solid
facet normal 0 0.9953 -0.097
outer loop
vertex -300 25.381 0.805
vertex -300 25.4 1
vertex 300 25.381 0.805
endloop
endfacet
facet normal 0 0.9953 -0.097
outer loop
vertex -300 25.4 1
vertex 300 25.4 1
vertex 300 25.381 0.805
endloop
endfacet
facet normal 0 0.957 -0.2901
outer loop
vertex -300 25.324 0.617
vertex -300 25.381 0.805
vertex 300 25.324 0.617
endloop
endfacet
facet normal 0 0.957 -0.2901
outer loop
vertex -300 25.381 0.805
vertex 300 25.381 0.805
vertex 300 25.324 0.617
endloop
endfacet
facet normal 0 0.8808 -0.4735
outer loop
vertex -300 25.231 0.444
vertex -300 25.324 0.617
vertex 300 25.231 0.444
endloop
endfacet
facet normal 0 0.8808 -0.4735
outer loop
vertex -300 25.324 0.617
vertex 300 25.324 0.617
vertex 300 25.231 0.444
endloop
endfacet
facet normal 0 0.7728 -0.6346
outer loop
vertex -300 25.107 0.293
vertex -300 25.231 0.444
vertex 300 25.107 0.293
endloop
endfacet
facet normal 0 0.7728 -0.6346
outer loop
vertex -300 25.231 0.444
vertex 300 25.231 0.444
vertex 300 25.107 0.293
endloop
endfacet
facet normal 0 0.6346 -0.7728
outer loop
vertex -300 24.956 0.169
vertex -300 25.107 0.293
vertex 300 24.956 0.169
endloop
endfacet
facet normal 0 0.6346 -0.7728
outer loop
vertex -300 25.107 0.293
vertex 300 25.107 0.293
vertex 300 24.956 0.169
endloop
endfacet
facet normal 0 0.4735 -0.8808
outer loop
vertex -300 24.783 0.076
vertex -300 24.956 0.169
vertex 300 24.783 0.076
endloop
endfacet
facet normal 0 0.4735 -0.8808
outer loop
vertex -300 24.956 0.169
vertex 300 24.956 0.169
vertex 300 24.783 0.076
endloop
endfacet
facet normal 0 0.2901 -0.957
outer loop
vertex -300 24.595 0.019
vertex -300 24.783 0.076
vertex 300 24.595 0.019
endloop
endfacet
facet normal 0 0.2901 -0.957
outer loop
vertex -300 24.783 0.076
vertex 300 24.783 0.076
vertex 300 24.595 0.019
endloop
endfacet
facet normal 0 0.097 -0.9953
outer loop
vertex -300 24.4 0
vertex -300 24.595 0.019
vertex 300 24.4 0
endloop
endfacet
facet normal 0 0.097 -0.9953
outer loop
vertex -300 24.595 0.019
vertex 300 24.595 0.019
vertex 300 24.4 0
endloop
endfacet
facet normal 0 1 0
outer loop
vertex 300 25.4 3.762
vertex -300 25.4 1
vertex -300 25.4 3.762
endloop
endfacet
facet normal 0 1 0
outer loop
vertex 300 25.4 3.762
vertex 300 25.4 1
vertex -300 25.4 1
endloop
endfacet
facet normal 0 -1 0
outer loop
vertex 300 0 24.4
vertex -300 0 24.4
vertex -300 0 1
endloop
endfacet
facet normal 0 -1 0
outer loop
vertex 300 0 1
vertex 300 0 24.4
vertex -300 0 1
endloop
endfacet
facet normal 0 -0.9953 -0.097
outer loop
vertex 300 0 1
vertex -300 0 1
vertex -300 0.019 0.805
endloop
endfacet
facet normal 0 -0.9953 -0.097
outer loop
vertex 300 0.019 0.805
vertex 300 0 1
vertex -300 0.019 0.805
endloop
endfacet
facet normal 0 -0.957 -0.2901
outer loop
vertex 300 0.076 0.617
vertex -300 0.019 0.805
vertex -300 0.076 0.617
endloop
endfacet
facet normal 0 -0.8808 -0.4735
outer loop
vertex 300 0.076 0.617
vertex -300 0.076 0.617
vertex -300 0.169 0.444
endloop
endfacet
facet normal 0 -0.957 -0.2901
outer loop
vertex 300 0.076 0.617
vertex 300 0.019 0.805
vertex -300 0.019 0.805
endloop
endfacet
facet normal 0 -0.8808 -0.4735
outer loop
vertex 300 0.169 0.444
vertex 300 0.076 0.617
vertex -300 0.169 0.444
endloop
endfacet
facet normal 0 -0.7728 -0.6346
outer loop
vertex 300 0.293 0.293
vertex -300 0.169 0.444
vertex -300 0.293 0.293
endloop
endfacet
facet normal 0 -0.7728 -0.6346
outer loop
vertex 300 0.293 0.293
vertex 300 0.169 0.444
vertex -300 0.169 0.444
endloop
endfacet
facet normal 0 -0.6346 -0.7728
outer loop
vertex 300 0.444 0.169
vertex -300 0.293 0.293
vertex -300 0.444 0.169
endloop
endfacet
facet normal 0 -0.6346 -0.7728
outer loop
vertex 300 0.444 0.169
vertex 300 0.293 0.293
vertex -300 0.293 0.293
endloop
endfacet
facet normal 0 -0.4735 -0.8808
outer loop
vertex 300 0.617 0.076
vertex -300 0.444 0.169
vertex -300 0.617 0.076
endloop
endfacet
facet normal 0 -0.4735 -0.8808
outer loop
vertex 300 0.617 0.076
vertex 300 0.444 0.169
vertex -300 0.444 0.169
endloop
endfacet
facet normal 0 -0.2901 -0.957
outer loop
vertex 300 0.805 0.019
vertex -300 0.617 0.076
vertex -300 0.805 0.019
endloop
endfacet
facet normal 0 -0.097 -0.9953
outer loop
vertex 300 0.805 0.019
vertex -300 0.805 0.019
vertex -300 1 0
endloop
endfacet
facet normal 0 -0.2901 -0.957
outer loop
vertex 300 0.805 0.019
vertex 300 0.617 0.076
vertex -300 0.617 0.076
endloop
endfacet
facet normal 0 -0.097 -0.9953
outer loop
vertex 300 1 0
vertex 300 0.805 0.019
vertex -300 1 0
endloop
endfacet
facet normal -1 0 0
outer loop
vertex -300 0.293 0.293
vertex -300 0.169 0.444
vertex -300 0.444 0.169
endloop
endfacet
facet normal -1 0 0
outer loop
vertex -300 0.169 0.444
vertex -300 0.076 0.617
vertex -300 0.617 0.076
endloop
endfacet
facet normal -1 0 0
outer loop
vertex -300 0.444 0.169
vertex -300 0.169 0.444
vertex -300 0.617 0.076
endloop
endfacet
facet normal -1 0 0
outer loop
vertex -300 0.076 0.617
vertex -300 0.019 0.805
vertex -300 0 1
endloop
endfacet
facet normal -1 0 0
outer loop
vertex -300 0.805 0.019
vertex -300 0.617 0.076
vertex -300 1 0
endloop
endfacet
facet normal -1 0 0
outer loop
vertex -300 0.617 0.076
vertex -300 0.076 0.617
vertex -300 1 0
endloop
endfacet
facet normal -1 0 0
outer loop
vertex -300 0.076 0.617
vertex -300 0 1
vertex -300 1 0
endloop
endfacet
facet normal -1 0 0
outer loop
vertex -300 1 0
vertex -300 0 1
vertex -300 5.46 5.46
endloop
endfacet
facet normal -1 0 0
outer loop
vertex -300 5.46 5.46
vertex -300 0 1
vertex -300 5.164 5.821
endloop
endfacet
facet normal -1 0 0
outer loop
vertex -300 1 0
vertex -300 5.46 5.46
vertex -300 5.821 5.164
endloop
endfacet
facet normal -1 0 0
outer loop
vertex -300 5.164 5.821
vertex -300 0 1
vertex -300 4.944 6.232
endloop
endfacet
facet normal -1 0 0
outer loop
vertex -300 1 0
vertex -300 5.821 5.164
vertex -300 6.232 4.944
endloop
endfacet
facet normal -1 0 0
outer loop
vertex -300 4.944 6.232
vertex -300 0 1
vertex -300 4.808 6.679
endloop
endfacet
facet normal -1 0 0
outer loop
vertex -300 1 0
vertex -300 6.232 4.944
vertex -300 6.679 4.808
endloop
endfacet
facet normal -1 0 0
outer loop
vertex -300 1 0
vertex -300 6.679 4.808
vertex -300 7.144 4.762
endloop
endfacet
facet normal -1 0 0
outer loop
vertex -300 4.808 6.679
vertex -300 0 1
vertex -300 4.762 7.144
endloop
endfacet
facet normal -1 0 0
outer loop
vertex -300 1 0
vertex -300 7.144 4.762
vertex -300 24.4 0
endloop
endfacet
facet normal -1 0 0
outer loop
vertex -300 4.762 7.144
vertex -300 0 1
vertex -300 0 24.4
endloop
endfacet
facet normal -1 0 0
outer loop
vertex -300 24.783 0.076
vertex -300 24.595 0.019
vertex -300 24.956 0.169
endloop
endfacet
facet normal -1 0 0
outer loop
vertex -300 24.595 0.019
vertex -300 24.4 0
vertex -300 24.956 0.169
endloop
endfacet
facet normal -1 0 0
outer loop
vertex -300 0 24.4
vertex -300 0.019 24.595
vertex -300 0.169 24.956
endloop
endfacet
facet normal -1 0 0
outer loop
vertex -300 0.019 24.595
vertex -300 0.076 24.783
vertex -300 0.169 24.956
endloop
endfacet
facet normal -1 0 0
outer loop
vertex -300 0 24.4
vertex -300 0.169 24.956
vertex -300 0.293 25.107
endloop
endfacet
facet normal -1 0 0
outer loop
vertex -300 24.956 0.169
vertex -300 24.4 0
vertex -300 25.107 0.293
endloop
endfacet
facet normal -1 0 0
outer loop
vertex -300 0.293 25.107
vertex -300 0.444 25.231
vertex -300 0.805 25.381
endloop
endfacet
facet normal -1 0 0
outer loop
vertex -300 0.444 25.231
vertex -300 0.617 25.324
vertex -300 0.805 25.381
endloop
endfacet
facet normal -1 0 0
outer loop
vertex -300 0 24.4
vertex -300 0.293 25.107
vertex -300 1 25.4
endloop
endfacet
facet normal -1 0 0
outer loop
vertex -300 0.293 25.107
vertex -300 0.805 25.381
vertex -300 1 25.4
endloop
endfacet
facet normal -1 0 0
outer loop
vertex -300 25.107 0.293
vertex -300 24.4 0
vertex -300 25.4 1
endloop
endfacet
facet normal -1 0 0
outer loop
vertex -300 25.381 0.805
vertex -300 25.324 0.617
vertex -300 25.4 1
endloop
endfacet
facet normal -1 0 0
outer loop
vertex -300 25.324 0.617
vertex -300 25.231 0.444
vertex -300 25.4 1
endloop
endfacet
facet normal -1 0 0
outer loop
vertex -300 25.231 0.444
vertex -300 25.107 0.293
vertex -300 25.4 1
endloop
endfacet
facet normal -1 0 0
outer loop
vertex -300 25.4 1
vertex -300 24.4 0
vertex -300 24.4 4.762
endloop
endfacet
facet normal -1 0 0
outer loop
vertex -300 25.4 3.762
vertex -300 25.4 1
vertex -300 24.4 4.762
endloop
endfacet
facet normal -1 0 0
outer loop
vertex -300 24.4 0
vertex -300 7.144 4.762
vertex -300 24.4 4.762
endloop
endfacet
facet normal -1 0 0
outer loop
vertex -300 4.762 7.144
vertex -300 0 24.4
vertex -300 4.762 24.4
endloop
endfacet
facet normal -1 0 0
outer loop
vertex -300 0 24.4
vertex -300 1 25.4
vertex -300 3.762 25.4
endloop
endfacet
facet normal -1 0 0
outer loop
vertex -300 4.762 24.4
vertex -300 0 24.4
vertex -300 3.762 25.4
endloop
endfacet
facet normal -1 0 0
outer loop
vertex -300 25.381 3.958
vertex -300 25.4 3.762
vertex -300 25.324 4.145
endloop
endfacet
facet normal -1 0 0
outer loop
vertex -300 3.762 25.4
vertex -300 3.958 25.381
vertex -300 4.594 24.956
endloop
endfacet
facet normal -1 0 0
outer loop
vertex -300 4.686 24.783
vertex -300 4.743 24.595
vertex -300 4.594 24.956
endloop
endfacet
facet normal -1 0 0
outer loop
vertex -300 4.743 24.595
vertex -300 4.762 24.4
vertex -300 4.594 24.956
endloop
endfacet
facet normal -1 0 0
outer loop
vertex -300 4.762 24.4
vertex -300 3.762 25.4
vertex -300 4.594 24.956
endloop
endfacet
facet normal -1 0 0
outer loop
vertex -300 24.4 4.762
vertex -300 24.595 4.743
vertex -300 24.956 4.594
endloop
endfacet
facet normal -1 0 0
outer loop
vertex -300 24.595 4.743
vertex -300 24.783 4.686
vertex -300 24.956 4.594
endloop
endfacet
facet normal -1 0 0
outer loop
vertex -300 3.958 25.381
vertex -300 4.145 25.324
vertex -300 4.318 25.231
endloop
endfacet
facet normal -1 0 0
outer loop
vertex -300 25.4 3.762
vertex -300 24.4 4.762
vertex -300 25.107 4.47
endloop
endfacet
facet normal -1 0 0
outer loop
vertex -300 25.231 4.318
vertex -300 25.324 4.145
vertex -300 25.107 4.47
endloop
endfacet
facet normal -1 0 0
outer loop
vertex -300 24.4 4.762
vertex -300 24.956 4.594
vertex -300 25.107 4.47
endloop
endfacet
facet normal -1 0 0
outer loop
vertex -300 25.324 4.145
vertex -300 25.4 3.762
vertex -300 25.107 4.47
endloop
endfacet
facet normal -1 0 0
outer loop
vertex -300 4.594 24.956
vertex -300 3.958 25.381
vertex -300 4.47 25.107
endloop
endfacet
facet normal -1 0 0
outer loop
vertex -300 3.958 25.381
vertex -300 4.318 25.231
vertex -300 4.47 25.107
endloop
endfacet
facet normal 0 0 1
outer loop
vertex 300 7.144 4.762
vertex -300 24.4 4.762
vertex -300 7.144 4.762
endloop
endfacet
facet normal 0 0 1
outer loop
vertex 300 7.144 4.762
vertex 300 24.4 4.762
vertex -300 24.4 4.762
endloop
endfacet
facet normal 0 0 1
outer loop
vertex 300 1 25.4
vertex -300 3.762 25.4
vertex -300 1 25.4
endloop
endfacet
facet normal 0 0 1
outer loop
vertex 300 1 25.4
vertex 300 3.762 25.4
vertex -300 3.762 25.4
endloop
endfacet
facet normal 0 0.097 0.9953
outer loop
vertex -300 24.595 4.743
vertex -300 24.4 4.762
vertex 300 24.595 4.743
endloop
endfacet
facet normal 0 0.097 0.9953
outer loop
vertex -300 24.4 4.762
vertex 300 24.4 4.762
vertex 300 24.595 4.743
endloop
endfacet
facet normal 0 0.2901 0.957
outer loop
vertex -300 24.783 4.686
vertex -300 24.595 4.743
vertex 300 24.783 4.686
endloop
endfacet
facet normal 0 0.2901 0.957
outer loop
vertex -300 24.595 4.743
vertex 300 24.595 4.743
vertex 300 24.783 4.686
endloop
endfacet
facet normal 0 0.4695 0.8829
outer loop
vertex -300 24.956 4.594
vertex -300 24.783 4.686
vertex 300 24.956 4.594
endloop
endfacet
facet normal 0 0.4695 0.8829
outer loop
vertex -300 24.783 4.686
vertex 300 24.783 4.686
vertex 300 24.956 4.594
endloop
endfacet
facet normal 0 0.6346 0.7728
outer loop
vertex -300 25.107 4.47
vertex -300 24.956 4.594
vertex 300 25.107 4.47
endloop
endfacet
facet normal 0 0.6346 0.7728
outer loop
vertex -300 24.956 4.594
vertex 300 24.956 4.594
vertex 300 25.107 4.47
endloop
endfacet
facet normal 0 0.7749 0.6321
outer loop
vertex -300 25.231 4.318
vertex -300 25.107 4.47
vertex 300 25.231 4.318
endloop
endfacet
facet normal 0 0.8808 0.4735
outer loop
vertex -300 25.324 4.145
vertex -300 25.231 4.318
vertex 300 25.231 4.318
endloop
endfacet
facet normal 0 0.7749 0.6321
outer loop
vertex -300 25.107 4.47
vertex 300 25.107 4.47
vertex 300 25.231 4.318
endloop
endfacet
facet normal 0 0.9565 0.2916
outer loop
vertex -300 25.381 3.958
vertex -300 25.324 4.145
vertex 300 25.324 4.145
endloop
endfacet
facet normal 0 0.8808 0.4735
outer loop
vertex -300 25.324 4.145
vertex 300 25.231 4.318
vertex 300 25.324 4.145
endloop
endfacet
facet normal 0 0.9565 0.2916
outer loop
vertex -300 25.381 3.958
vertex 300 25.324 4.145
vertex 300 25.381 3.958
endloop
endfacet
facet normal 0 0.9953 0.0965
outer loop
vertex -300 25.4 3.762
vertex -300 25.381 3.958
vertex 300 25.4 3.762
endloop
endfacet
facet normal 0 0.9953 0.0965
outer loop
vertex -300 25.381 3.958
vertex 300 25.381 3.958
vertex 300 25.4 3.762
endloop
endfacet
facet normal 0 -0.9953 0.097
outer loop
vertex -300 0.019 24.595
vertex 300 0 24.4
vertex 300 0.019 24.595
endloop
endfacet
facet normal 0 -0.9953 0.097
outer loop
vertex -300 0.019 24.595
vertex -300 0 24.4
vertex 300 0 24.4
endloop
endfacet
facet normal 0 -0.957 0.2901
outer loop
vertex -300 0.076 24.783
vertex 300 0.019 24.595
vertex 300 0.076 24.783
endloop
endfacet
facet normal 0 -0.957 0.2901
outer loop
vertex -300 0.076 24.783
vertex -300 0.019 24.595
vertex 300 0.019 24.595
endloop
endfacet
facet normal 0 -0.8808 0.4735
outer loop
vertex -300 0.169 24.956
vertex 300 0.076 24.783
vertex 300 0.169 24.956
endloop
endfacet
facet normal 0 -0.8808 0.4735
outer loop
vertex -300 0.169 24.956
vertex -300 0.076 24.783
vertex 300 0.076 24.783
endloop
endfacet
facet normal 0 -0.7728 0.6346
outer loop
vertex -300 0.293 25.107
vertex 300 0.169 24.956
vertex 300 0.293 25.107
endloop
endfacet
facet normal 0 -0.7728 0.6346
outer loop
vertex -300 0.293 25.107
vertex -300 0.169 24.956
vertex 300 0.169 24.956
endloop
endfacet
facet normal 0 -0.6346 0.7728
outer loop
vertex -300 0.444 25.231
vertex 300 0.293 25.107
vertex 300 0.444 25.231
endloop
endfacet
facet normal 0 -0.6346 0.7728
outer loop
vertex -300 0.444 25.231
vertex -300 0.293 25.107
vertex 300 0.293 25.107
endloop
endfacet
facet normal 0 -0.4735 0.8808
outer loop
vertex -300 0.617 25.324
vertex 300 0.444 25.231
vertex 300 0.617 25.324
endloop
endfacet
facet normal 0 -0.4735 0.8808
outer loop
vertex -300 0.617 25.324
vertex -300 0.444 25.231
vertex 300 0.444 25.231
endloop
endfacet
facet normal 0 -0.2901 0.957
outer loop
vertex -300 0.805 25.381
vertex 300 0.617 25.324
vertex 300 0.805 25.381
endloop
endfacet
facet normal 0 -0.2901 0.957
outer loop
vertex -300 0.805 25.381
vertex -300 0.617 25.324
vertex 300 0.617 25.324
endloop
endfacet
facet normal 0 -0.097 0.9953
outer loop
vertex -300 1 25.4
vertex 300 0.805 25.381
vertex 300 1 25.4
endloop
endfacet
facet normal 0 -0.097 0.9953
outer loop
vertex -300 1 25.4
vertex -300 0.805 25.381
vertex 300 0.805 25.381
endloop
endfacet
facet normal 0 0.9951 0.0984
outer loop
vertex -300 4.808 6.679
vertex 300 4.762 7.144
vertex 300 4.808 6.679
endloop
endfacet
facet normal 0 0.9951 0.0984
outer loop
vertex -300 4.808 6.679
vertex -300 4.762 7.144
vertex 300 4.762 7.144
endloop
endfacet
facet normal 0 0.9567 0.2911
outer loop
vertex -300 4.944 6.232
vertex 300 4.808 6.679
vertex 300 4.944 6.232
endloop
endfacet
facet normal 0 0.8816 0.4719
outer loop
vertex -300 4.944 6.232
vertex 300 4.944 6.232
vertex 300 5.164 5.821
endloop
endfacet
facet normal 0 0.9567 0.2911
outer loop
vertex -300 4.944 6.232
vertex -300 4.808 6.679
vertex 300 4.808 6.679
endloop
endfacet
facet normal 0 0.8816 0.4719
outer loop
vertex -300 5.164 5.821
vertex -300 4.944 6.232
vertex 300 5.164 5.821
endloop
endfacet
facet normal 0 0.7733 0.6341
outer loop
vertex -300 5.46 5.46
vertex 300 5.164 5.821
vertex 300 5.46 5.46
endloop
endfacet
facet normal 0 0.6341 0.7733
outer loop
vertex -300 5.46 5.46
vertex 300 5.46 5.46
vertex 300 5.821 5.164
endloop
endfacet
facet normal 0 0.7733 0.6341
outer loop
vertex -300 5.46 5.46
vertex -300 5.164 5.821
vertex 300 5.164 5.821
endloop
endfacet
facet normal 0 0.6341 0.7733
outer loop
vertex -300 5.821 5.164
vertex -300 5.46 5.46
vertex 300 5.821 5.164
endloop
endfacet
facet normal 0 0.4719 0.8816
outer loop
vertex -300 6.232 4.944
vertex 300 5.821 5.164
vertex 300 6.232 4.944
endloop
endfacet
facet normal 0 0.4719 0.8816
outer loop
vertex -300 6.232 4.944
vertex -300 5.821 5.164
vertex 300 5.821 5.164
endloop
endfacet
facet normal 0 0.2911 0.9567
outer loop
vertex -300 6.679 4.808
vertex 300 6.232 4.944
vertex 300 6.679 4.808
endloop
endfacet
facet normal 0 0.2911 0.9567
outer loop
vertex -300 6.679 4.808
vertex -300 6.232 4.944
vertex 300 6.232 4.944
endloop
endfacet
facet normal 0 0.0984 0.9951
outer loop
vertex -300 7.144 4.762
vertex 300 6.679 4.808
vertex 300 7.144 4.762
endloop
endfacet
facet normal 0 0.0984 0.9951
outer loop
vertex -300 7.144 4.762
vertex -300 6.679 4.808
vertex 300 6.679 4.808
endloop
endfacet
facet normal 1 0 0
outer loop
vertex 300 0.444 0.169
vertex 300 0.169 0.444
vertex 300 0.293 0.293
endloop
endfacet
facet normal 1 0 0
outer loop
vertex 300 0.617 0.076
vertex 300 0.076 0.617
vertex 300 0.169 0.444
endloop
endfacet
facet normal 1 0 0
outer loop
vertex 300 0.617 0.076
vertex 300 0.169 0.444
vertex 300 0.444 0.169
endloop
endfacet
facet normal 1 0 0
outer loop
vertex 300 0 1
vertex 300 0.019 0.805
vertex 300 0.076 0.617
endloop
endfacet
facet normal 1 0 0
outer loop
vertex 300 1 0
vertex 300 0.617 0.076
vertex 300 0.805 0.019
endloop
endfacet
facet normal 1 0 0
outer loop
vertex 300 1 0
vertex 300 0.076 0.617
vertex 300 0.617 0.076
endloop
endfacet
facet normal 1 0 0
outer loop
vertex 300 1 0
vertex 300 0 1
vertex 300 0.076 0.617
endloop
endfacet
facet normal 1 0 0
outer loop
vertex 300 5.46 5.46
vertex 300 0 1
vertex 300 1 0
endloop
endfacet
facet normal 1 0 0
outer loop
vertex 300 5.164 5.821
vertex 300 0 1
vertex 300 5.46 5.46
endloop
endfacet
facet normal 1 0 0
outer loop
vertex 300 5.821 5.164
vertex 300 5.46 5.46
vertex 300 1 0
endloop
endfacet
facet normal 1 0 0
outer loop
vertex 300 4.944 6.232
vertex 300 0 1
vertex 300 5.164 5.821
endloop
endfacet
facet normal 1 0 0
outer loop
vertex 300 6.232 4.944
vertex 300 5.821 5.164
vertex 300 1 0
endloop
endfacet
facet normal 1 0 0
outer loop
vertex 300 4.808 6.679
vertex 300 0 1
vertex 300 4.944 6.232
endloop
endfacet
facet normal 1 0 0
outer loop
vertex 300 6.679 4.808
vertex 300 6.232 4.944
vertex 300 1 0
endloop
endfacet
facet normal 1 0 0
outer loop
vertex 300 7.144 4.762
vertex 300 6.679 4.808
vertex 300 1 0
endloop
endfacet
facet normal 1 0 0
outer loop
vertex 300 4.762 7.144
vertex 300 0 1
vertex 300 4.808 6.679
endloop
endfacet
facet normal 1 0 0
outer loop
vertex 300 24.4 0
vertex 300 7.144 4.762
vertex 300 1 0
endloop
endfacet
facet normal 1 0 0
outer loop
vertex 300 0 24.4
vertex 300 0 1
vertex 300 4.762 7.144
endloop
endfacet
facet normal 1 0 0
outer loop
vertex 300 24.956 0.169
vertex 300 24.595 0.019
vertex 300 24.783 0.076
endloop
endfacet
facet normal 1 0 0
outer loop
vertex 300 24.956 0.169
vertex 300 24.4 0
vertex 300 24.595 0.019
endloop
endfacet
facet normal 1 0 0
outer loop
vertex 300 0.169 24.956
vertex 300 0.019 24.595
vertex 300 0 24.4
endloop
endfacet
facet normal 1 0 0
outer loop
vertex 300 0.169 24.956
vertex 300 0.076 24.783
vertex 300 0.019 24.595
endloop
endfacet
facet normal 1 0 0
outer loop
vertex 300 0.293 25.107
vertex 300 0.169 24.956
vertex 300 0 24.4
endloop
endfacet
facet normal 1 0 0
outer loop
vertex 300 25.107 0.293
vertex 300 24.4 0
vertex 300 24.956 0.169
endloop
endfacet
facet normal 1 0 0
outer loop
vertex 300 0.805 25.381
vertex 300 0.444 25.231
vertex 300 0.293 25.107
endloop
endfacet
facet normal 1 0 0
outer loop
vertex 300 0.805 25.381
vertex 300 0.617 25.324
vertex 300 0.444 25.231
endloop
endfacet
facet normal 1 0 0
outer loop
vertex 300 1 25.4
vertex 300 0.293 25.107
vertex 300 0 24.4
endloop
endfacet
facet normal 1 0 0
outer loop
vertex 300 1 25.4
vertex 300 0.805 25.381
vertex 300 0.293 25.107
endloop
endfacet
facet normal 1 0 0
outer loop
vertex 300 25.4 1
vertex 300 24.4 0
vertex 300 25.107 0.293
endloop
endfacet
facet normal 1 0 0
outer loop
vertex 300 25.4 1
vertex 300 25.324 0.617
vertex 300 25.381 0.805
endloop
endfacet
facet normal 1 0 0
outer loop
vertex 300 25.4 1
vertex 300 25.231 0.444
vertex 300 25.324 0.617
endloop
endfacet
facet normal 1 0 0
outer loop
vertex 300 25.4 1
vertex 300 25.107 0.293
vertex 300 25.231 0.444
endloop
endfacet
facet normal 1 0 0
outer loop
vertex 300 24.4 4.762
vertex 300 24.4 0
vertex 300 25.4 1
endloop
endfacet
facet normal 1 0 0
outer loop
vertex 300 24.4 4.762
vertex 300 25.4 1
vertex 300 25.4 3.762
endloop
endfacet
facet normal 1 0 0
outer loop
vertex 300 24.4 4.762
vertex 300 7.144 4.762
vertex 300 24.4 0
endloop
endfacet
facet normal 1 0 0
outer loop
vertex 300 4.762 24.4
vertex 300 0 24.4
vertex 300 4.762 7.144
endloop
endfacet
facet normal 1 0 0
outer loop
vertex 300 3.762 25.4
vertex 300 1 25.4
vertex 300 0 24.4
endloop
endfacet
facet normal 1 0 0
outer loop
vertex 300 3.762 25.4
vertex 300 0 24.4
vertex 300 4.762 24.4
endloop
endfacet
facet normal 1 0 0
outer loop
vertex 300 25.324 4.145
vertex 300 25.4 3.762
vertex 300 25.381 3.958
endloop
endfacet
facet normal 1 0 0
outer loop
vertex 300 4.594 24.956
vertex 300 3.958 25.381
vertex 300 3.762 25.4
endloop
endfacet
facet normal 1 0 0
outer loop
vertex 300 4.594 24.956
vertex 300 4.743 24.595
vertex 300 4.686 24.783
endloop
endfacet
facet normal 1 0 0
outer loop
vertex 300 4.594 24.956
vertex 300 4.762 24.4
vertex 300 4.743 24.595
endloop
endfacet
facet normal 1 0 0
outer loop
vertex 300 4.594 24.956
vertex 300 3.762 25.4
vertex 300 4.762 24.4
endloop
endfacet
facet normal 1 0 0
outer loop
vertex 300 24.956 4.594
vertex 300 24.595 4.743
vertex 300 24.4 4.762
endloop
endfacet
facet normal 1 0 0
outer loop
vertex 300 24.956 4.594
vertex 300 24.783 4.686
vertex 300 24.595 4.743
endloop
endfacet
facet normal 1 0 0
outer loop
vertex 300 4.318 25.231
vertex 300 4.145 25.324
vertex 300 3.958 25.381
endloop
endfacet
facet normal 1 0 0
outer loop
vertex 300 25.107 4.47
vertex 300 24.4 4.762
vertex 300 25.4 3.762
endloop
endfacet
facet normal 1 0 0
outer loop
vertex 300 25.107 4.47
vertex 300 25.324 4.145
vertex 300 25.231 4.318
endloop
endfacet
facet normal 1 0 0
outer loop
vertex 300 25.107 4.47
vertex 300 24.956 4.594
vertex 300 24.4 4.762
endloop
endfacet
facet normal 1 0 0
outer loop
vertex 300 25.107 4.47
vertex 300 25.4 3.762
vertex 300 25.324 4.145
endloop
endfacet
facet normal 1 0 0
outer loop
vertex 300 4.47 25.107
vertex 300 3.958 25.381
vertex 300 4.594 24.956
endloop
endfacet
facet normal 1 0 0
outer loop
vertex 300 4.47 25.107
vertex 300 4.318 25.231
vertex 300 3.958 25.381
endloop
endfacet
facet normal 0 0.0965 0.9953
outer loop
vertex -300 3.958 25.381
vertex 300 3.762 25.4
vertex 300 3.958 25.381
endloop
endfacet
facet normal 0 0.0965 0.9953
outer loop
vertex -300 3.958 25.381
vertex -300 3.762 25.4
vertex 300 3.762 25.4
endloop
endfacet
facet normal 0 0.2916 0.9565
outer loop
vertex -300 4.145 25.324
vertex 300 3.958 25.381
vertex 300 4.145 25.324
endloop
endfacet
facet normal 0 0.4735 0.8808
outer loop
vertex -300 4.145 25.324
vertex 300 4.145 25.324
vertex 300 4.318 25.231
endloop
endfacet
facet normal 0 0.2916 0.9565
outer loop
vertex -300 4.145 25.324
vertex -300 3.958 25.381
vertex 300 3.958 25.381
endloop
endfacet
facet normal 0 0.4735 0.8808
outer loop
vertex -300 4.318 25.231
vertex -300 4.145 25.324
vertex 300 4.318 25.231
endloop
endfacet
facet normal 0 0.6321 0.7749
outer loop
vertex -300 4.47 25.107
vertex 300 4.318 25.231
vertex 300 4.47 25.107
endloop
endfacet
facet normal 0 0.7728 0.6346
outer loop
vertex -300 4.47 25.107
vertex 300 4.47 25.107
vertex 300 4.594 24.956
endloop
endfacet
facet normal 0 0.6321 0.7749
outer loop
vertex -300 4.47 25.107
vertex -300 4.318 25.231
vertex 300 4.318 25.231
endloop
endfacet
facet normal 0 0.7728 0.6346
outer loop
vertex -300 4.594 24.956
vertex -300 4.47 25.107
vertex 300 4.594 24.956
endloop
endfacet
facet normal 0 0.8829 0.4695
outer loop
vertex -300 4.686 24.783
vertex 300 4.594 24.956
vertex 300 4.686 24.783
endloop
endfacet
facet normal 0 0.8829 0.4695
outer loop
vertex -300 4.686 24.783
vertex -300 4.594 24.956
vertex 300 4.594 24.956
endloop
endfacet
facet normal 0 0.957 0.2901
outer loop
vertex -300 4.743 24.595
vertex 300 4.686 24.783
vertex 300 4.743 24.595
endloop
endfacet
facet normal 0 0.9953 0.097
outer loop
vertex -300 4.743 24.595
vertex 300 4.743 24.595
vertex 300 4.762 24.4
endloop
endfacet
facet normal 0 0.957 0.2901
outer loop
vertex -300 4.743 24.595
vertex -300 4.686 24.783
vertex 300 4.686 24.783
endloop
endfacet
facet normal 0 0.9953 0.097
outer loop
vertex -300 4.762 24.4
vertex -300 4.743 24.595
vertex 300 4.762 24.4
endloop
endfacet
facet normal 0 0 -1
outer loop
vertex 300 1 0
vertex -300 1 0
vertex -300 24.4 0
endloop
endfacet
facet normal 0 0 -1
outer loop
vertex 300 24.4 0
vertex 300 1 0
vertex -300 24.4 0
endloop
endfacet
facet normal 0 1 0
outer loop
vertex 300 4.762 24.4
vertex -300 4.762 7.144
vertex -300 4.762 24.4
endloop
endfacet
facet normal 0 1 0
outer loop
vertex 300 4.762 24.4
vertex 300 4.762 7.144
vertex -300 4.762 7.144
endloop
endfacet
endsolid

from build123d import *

# Parameters (mm, degrees)
F1_DEPTH = 300
F2_R     = 1
F3_R     = 2.38125


with BuildPart() as f1:
    # F0 (on Right) → F1 (new body, symmetric)
    with BuildSketch(Plane.YZ):
        Polygon((0, 25.4), (0, 0), (25.4, 0), (25.4, 4.7625), (4.7625, 4.7625), (4.7625, 25.4), align=None)
    extrude(amount=F1_DEPTH, both=True)

    # F2
    f2_edges = [f1.edges().sort_by_distance(p)[0] for p in [
        (0, 0, 25.4),
        (0, 4.7625, 25.4),
        (0, 0, 0),
        (0, 25.4, 4.7625),
        (0, 25.4, 0),
    ]]
    fillet(f2_edges, radius=F2_R)

    # F3
    f3_edges = [f1.edges().sort_by_distance(p)[0] for p in [
        (0, 4.7625, 4.7625),
    ]]
    fillet(f3_edges, radius=F3_R)


solid = f1.part
